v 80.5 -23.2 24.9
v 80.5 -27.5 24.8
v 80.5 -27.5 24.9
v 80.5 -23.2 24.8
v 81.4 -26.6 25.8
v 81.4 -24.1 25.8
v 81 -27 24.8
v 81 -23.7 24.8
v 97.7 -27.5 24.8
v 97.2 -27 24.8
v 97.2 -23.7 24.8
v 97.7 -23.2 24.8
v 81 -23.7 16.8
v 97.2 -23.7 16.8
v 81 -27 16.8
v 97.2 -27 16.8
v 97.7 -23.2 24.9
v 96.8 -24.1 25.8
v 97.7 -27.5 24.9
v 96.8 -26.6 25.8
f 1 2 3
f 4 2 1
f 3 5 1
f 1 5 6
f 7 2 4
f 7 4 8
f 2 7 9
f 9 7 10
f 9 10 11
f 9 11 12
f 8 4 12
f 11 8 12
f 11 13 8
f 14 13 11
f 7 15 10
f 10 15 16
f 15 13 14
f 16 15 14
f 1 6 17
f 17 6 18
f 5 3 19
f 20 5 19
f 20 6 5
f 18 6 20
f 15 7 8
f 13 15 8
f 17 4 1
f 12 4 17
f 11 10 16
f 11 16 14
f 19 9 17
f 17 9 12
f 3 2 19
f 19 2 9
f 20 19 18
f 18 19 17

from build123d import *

# Parameters (mm, degrees)
BOX017_W        = 17.2
BOX017_H        = 4.3
BOX017_DEPTH    = 1
BOX016_W        = 16.2
BOX016_H        = 3.3
BOX016_DEPTH    = 8
CHAMFER_SIZE    = 0.9
CHAMFER001_SIZE = 0.9


with BuildPart() as tapa_puerta001:
    # Box017 → Box017 (new body)
    with BuildSketch(Plane(origin=(80.5, -27.5, 22.8), x_dir=(1, 0, 0), z_dir=(0, 0, 1))):
        with Locations((8.6, 2.15)):
            Rectangle(BOX017_W, BOX017_H)
    extrude(amount=BOX017_DEPTH)


with BuildPart() as tapa_puerta:
    # Box016 → Box016 (new body)
    with BuildSketch(Plane(origin=(81, -27, 14.8), x_dir=(1, 0, 0), z_dir=(0, 0, 1))):
        with Locations((8.1, 1.65)):
            Rectangle(BOX016_W, BOX016_H)
    extrude(amount=BOX016_DEPTH)

    # Fusion006: union tapa_puerta001
    add(tapa_puerta001.part)

    # Chamfer
    chamfer_edges = [tapa_puerta.edges().sort_by_distance(p)[0] for p in [
        (89.1, -23.2, 23.8),
    ]]
    chamfer(chamfer_edges, length=CHAMFER_SIZE)

    # Chamfer001
    chamfer001_edges = [tapa_puerta.edges().sort_by_distance(p)[0] for p in [
        (80.5, -25.8, 23.8),
        (89.1, -27.5, 23.8),
        (97.7, -25.8, 23.8),
    ]]
    chamfer(chamfer001_edges, length=CHAMFER001_SIZE)


with BuildPart() as tapa_puerta_1:
    # Chamfer001 placement: moved
    add(tapa_puerta.part.moved(Location((0, 0, 2))))


solid = tapa_puerta_1.part
